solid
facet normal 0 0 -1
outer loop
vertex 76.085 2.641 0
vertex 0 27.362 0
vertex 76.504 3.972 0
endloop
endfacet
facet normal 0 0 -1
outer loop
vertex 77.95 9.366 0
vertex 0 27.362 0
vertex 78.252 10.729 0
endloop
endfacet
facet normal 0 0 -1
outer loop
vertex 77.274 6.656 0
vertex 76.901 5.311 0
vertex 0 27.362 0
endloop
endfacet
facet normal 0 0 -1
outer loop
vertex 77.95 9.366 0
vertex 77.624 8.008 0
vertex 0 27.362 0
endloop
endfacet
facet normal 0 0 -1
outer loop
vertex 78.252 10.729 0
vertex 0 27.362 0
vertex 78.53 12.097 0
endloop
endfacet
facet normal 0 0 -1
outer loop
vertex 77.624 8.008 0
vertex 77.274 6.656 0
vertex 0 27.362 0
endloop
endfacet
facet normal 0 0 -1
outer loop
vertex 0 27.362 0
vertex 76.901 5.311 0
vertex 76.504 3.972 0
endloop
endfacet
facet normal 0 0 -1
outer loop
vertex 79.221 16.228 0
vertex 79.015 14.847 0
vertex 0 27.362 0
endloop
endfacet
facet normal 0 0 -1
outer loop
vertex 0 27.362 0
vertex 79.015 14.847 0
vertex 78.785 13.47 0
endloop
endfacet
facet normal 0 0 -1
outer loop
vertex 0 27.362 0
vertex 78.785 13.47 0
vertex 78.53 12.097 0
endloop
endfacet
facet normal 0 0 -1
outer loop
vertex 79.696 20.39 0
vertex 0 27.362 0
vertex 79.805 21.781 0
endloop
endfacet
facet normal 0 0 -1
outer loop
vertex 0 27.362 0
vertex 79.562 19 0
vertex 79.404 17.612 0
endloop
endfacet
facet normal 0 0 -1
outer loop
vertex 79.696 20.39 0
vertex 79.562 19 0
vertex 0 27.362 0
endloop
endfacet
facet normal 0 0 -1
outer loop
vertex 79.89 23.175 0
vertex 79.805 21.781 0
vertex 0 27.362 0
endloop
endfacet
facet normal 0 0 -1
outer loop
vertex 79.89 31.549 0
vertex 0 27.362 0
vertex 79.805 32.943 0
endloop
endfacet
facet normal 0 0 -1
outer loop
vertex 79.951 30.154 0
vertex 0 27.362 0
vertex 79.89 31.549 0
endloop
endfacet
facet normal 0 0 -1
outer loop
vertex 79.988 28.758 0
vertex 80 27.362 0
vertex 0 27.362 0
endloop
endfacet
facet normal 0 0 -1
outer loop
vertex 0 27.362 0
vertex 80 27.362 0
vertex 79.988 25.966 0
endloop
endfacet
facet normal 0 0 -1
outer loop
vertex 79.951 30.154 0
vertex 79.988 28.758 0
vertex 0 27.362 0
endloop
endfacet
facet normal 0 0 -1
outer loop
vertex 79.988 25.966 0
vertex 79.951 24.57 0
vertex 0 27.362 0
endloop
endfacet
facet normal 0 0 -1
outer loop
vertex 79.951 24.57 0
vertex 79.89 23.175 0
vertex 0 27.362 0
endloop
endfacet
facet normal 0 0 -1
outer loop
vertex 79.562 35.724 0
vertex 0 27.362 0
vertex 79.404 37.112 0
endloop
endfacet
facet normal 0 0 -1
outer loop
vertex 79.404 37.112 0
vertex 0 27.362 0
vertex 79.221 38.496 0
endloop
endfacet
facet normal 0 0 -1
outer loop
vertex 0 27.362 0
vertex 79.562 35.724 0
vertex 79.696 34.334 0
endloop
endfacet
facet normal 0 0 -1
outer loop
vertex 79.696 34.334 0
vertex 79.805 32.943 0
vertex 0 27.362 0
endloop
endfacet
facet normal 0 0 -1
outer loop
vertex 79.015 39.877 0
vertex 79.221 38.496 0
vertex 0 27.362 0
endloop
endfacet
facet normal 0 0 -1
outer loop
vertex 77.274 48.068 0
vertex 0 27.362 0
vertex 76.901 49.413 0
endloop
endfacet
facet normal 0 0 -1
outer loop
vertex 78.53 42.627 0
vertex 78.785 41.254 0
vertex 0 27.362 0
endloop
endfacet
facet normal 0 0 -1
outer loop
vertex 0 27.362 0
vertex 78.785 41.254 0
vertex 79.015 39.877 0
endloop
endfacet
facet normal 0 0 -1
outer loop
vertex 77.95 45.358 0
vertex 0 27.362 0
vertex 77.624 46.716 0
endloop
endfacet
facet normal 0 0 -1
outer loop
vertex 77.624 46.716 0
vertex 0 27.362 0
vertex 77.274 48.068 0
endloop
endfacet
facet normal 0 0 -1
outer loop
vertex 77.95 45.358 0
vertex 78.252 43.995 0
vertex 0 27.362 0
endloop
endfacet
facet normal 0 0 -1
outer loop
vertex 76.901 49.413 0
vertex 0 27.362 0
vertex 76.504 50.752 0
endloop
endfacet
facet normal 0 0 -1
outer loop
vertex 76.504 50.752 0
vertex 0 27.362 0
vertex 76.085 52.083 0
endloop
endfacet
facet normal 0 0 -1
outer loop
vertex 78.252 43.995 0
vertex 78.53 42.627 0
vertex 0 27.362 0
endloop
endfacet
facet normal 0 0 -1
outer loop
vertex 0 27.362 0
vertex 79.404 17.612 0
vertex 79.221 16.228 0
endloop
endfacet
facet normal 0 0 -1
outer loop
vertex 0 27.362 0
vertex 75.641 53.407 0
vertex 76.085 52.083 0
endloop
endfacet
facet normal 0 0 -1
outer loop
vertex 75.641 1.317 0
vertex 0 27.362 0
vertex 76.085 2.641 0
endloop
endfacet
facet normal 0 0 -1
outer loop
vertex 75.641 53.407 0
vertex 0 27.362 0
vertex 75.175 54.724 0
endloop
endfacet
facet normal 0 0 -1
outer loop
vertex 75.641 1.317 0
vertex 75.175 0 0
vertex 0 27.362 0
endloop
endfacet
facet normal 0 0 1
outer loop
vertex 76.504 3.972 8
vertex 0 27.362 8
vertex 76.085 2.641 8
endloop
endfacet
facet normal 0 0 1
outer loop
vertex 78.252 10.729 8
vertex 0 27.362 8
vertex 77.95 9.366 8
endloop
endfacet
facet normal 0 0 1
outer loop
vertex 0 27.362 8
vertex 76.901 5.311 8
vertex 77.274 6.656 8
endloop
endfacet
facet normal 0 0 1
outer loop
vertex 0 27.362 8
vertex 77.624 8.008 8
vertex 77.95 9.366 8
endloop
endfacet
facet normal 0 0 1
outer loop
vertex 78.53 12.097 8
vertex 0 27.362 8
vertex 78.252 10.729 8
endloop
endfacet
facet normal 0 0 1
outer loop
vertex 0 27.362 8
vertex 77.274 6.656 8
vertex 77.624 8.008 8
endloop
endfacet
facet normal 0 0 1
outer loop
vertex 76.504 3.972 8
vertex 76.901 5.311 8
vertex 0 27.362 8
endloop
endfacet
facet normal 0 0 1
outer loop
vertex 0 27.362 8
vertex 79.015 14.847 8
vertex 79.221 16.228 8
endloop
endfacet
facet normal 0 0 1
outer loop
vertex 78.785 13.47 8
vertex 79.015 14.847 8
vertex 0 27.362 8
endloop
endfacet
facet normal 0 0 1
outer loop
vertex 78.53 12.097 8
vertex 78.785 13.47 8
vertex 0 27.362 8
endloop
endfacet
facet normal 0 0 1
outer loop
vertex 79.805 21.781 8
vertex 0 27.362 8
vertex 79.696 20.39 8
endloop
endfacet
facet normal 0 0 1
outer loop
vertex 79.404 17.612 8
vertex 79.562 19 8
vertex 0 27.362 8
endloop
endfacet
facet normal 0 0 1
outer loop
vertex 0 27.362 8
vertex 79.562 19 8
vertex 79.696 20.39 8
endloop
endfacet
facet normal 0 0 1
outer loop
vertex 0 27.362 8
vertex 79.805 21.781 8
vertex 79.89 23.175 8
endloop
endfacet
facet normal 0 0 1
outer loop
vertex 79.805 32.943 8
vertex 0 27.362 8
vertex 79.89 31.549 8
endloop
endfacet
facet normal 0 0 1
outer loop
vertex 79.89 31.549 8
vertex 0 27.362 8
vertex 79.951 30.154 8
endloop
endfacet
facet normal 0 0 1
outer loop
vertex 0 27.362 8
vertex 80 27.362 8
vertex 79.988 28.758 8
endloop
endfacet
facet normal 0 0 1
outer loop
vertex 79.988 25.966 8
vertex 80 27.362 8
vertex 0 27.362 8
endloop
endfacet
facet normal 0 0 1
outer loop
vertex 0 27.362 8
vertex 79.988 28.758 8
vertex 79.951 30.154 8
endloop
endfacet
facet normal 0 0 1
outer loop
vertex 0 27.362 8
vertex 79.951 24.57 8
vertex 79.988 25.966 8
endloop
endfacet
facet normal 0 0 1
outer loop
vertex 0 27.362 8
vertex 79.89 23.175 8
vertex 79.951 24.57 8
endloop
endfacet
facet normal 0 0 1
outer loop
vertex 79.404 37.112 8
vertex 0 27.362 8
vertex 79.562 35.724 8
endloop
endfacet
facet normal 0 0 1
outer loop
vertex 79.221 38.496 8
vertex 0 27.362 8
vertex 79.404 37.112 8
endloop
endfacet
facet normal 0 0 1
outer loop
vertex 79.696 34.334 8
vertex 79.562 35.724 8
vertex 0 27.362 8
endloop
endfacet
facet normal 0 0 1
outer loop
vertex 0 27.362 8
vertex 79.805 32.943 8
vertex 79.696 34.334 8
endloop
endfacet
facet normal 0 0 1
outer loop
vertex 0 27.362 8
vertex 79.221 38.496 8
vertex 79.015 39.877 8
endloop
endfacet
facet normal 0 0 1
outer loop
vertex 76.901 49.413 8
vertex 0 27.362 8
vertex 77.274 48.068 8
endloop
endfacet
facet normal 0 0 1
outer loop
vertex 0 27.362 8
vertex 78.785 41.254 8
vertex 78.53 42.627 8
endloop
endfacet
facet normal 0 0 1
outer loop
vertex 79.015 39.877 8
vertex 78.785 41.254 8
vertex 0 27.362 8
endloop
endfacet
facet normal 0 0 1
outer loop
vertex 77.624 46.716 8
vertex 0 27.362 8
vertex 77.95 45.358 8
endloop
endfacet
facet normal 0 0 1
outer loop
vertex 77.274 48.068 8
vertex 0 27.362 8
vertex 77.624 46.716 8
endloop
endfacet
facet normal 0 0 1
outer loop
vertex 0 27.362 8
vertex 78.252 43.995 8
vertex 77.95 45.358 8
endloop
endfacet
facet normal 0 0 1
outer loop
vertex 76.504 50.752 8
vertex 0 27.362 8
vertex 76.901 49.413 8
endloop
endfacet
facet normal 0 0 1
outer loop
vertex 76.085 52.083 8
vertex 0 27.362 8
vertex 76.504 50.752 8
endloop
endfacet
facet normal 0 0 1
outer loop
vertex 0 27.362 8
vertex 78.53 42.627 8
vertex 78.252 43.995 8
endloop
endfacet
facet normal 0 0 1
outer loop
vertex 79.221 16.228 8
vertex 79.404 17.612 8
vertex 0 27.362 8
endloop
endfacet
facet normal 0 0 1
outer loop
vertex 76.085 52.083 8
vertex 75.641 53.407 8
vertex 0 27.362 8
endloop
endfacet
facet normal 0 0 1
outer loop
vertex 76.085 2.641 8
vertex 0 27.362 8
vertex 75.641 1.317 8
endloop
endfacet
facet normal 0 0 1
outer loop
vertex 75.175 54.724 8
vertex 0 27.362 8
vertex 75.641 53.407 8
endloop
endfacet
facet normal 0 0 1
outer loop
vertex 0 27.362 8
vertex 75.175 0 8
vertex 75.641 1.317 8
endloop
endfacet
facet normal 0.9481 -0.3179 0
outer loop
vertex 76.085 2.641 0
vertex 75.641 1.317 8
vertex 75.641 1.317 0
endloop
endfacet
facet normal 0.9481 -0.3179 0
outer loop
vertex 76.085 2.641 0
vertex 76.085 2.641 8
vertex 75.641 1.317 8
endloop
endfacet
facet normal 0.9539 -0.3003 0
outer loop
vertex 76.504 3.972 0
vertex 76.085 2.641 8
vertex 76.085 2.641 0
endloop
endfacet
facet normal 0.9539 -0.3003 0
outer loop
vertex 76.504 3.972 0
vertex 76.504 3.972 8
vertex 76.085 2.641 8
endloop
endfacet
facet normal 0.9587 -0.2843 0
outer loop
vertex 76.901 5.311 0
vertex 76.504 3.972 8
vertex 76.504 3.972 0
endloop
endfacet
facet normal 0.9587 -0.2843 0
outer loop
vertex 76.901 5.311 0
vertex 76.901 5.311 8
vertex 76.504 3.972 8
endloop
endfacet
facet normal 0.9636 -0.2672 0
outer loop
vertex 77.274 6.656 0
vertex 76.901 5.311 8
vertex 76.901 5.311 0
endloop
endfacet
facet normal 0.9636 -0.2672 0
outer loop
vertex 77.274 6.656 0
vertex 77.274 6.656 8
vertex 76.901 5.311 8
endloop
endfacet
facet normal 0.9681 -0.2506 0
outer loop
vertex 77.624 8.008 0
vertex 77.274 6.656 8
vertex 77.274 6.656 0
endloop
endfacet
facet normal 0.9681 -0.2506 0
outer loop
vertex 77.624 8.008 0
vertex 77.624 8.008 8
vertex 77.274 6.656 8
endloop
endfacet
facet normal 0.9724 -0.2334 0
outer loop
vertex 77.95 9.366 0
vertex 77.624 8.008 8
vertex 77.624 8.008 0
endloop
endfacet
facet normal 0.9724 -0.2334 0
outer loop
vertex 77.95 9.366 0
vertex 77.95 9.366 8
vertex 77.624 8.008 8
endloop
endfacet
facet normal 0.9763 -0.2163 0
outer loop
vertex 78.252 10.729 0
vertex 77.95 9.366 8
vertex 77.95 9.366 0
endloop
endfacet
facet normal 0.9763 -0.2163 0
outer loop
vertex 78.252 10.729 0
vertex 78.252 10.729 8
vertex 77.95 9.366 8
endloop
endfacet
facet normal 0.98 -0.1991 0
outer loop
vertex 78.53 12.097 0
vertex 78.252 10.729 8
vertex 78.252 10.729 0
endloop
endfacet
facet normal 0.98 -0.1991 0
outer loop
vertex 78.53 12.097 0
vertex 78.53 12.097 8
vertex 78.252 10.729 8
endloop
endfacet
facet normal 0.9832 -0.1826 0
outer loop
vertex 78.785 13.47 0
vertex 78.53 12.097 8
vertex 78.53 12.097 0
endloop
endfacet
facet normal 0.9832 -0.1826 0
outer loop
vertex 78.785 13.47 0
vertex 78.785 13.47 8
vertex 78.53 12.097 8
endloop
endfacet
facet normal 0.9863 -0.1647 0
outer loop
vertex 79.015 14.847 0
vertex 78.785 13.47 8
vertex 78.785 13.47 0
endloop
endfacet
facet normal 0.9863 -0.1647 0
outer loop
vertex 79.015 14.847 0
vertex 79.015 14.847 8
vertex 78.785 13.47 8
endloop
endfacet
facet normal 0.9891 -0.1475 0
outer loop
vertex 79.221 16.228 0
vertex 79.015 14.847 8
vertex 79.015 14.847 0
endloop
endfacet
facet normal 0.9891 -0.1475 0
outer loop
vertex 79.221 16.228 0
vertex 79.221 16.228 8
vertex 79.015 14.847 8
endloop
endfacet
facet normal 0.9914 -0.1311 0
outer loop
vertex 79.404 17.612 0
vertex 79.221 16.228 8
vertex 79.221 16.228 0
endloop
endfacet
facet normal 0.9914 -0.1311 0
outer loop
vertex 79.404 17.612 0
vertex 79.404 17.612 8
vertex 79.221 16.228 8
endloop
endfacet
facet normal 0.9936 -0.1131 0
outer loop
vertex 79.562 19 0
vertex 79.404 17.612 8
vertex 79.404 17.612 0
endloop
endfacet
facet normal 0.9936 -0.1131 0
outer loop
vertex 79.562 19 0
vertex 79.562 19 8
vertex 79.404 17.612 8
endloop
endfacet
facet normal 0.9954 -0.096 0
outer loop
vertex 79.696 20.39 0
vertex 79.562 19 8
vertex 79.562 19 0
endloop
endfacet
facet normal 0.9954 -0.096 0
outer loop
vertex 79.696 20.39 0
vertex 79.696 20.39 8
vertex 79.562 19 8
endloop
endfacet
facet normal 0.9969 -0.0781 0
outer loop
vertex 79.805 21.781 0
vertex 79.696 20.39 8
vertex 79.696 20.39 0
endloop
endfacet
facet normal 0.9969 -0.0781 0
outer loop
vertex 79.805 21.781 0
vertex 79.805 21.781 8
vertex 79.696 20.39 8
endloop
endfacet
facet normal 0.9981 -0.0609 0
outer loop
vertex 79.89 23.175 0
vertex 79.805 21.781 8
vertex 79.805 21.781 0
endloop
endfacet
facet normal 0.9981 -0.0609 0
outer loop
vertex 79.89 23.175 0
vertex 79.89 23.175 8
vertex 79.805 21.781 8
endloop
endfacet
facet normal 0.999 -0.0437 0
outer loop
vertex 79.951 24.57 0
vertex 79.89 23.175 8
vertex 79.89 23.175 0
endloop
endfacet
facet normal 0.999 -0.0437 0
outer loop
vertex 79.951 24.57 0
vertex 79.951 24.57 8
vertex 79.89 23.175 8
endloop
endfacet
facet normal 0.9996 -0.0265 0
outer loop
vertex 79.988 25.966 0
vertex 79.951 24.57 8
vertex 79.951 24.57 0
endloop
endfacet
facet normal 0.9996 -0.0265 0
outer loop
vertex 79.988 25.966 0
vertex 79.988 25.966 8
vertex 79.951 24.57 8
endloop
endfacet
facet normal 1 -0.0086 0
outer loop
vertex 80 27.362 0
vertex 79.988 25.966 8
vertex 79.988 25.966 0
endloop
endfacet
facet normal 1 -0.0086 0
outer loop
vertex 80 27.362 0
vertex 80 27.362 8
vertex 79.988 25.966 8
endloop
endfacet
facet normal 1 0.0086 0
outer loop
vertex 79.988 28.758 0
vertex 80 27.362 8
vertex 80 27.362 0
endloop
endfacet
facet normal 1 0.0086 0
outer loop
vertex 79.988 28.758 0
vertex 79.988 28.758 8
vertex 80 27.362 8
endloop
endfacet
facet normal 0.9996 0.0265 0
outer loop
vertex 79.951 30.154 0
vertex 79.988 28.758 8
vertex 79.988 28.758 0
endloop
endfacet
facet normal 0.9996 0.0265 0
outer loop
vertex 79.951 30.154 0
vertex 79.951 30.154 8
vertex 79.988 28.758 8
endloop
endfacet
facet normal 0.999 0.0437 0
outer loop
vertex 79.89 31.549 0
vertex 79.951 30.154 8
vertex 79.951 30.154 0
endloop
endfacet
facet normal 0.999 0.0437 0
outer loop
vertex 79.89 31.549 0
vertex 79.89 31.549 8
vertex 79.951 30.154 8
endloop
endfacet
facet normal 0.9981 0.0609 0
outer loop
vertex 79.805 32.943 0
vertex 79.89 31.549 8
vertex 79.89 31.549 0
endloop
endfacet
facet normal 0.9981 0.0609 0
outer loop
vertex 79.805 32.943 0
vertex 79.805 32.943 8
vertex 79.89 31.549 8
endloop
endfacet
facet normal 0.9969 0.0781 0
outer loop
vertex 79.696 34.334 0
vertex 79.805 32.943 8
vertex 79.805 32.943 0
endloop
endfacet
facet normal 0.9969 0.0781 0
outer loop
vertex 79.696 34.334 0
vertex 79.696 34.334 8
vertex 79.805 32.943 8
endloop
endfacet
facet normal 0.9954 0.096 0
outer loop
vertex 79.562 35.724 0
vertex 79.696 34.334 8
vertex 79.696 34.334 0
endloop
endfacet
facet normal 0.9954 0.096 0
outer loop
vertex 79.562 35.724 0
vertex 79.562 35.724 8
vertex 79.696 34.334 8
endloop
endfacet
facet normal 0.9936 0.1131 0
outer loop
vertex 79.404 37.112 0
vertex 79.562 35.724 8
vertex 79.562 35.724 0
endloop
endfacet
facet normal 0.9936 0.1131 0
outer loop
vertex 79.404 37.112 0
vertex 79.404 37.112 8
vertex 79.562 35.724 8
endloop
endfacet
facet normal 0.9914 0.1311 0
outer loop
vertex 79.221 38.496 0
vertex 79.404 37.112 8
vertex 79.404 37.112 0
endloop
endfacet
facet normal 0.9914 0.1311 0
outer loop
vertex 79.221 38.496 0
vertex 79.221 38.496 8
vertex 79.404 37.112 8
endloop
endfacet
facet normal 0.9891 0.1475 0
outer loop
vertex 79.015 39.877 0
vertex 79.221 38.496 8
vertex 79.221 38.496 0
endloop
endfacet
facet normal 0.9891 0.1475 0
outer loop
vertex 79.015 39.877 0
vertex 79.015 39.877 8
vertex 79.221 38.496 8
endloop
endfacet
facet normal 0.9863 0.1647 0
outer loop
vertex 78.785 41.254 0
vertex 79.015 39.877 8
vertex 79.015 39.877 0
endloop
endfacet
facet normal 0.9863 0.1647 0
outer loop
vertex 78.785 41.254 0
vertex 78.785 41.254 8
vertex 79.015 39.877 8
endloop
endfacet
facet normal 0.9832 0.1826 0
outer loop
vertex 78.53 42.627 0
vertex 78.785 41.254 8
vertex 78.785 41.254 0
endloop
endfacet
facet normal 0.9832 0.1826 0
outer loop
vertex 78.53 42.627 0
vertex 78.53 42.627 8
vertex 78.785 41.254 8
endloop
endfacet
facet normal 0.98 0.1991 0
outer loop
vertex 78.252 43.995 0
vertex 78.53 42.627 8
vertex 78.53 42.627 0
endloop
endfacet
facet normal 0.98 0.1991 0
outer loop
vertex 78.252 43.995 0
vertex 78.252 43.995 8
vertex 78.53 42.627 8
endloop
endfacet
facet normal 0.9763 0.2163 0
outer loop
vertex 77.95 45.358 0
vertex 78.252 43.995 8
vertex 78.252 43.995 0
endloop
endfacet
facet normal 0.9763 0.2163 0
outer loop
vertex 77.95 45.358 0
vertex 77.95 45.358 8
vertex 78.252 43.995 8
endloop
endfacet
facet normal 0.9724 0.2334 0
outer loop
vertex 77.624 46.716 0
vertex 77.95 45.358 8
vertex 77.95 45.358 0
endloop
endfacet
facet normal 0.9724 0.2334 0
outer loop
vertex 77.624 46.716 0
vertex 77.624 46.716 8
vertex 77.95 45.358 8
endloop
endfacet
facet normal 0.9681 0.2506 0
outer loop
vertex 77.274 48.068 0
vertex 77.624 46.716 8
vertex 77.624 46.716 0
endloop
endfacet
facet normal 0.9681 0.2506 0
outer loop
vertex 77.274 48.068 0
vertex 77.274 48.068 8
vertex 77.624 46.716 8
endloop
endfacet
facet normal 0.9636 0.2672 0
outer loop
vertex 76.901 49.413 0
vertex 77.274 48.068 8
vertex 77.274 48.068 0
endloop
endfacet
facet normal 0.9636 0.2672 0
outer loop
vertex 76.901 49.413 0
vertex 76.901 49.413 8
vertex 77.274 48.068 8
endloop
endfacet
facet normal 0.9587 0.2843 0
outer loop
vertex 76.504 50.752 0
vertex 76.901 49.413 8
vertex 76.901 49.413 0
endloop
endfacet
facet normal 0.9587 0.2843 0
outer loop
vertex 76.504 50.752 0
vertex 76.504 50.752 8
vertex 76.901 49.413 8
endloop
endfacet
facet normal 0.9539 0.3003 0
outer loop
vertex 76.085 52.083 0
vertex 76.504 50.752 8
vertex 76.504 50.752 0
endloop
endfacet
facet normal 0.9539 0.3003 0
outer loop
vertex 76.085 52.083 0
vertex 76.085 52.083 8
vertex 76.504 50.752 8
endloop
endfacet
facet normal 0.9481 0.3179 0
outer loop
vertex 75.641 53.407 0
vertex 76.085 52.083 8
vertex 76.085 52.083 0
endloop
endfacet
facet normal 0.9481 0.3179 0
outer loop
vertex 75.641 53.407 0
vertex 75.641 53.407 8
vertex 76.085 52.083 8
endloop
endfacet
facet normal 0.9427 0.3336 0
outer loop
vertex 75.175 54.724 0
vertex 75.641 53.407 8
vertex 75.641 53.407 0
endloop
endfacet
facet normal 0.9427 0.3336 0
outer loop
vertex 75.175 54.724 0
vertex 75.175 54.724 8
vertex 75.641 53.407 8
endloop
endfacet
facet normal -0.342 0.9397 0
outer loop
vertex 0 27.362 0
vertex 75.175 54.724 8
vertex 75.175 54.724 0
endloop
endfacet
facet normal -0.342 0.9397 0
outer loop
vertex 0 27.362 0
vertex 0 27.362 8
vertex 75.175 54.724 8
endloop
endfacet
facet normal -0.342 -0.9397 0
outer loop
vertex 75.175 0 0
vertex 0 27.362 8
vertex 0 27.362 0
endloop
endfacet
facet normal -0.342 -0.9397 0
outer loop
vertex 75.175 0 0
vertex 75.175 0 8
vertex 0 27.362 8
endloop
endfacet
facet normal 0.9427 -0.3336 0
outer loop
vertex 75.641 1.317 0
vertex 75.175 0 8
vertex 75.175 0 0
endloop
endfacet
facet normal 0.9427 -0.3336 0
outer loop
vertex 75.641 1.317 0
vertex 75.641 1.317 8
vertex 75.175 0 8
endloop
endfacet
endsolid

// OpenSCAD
$fn = 32;

// ----------------------------------------------------------------------
// Arc profile plate: sector, 42 points
// ----------------------------------------------------------------------

// --- parameters (mm) ---
sector_angle = 40;        // sector angle, degrees
sector_r = 80;            // outer radius
arc_step = 1;             // sampling step of the arc, degrees
plate_t = 8;              // plate thickness, Z

bbox_x = 2 * sector_r * sin(sector_angle / 2);  // chord of the sector
bbox_y = sector_r;  // depth of the sector (apex to arc)

profile = [[75.175, 0], [75.641, 1.317], [76.085, 2.641], [76.504, 3.972], [76.901, 5.311], [77.274, 6.656], [77.624, 8.008], [77.95, 9.366], [78.252, 10.729], [78.53, 12.097], [78.785, 13.47], [79.015, 14.847], [79.221, 16.228], [79.404, 17.612], [79.562, 19], [79.696, 20.39], [79.805, 21.781], [79.89, 23.175], [79.951, 24.57], [79.988, 25.966], [80, 27.362], [79.988, 28.758], [79.951, 30.154], [79.89, 31.549], [79.805, 32.943], [79.696, 34.334], [79.562, 35.724], [79.404, 37.112], [79.221, 38.496], [79.015, 39.877], [78.785, 41.254], [78.53, 42.627], [78.252, 43.995], [77.95, 45.358], [77.624, 46.716], [77.274, 48.068], [76.901, 49.413], [76.504, 50.752], [76.085, 52.083], [75.641, 53.407], [75.175, 54.724], [0, 27.362]];  // primary outline, 42 points, counter clockwise

// --- the one profile operation ---
linear_extrude(height = plate_t) polygon(points = profile);
